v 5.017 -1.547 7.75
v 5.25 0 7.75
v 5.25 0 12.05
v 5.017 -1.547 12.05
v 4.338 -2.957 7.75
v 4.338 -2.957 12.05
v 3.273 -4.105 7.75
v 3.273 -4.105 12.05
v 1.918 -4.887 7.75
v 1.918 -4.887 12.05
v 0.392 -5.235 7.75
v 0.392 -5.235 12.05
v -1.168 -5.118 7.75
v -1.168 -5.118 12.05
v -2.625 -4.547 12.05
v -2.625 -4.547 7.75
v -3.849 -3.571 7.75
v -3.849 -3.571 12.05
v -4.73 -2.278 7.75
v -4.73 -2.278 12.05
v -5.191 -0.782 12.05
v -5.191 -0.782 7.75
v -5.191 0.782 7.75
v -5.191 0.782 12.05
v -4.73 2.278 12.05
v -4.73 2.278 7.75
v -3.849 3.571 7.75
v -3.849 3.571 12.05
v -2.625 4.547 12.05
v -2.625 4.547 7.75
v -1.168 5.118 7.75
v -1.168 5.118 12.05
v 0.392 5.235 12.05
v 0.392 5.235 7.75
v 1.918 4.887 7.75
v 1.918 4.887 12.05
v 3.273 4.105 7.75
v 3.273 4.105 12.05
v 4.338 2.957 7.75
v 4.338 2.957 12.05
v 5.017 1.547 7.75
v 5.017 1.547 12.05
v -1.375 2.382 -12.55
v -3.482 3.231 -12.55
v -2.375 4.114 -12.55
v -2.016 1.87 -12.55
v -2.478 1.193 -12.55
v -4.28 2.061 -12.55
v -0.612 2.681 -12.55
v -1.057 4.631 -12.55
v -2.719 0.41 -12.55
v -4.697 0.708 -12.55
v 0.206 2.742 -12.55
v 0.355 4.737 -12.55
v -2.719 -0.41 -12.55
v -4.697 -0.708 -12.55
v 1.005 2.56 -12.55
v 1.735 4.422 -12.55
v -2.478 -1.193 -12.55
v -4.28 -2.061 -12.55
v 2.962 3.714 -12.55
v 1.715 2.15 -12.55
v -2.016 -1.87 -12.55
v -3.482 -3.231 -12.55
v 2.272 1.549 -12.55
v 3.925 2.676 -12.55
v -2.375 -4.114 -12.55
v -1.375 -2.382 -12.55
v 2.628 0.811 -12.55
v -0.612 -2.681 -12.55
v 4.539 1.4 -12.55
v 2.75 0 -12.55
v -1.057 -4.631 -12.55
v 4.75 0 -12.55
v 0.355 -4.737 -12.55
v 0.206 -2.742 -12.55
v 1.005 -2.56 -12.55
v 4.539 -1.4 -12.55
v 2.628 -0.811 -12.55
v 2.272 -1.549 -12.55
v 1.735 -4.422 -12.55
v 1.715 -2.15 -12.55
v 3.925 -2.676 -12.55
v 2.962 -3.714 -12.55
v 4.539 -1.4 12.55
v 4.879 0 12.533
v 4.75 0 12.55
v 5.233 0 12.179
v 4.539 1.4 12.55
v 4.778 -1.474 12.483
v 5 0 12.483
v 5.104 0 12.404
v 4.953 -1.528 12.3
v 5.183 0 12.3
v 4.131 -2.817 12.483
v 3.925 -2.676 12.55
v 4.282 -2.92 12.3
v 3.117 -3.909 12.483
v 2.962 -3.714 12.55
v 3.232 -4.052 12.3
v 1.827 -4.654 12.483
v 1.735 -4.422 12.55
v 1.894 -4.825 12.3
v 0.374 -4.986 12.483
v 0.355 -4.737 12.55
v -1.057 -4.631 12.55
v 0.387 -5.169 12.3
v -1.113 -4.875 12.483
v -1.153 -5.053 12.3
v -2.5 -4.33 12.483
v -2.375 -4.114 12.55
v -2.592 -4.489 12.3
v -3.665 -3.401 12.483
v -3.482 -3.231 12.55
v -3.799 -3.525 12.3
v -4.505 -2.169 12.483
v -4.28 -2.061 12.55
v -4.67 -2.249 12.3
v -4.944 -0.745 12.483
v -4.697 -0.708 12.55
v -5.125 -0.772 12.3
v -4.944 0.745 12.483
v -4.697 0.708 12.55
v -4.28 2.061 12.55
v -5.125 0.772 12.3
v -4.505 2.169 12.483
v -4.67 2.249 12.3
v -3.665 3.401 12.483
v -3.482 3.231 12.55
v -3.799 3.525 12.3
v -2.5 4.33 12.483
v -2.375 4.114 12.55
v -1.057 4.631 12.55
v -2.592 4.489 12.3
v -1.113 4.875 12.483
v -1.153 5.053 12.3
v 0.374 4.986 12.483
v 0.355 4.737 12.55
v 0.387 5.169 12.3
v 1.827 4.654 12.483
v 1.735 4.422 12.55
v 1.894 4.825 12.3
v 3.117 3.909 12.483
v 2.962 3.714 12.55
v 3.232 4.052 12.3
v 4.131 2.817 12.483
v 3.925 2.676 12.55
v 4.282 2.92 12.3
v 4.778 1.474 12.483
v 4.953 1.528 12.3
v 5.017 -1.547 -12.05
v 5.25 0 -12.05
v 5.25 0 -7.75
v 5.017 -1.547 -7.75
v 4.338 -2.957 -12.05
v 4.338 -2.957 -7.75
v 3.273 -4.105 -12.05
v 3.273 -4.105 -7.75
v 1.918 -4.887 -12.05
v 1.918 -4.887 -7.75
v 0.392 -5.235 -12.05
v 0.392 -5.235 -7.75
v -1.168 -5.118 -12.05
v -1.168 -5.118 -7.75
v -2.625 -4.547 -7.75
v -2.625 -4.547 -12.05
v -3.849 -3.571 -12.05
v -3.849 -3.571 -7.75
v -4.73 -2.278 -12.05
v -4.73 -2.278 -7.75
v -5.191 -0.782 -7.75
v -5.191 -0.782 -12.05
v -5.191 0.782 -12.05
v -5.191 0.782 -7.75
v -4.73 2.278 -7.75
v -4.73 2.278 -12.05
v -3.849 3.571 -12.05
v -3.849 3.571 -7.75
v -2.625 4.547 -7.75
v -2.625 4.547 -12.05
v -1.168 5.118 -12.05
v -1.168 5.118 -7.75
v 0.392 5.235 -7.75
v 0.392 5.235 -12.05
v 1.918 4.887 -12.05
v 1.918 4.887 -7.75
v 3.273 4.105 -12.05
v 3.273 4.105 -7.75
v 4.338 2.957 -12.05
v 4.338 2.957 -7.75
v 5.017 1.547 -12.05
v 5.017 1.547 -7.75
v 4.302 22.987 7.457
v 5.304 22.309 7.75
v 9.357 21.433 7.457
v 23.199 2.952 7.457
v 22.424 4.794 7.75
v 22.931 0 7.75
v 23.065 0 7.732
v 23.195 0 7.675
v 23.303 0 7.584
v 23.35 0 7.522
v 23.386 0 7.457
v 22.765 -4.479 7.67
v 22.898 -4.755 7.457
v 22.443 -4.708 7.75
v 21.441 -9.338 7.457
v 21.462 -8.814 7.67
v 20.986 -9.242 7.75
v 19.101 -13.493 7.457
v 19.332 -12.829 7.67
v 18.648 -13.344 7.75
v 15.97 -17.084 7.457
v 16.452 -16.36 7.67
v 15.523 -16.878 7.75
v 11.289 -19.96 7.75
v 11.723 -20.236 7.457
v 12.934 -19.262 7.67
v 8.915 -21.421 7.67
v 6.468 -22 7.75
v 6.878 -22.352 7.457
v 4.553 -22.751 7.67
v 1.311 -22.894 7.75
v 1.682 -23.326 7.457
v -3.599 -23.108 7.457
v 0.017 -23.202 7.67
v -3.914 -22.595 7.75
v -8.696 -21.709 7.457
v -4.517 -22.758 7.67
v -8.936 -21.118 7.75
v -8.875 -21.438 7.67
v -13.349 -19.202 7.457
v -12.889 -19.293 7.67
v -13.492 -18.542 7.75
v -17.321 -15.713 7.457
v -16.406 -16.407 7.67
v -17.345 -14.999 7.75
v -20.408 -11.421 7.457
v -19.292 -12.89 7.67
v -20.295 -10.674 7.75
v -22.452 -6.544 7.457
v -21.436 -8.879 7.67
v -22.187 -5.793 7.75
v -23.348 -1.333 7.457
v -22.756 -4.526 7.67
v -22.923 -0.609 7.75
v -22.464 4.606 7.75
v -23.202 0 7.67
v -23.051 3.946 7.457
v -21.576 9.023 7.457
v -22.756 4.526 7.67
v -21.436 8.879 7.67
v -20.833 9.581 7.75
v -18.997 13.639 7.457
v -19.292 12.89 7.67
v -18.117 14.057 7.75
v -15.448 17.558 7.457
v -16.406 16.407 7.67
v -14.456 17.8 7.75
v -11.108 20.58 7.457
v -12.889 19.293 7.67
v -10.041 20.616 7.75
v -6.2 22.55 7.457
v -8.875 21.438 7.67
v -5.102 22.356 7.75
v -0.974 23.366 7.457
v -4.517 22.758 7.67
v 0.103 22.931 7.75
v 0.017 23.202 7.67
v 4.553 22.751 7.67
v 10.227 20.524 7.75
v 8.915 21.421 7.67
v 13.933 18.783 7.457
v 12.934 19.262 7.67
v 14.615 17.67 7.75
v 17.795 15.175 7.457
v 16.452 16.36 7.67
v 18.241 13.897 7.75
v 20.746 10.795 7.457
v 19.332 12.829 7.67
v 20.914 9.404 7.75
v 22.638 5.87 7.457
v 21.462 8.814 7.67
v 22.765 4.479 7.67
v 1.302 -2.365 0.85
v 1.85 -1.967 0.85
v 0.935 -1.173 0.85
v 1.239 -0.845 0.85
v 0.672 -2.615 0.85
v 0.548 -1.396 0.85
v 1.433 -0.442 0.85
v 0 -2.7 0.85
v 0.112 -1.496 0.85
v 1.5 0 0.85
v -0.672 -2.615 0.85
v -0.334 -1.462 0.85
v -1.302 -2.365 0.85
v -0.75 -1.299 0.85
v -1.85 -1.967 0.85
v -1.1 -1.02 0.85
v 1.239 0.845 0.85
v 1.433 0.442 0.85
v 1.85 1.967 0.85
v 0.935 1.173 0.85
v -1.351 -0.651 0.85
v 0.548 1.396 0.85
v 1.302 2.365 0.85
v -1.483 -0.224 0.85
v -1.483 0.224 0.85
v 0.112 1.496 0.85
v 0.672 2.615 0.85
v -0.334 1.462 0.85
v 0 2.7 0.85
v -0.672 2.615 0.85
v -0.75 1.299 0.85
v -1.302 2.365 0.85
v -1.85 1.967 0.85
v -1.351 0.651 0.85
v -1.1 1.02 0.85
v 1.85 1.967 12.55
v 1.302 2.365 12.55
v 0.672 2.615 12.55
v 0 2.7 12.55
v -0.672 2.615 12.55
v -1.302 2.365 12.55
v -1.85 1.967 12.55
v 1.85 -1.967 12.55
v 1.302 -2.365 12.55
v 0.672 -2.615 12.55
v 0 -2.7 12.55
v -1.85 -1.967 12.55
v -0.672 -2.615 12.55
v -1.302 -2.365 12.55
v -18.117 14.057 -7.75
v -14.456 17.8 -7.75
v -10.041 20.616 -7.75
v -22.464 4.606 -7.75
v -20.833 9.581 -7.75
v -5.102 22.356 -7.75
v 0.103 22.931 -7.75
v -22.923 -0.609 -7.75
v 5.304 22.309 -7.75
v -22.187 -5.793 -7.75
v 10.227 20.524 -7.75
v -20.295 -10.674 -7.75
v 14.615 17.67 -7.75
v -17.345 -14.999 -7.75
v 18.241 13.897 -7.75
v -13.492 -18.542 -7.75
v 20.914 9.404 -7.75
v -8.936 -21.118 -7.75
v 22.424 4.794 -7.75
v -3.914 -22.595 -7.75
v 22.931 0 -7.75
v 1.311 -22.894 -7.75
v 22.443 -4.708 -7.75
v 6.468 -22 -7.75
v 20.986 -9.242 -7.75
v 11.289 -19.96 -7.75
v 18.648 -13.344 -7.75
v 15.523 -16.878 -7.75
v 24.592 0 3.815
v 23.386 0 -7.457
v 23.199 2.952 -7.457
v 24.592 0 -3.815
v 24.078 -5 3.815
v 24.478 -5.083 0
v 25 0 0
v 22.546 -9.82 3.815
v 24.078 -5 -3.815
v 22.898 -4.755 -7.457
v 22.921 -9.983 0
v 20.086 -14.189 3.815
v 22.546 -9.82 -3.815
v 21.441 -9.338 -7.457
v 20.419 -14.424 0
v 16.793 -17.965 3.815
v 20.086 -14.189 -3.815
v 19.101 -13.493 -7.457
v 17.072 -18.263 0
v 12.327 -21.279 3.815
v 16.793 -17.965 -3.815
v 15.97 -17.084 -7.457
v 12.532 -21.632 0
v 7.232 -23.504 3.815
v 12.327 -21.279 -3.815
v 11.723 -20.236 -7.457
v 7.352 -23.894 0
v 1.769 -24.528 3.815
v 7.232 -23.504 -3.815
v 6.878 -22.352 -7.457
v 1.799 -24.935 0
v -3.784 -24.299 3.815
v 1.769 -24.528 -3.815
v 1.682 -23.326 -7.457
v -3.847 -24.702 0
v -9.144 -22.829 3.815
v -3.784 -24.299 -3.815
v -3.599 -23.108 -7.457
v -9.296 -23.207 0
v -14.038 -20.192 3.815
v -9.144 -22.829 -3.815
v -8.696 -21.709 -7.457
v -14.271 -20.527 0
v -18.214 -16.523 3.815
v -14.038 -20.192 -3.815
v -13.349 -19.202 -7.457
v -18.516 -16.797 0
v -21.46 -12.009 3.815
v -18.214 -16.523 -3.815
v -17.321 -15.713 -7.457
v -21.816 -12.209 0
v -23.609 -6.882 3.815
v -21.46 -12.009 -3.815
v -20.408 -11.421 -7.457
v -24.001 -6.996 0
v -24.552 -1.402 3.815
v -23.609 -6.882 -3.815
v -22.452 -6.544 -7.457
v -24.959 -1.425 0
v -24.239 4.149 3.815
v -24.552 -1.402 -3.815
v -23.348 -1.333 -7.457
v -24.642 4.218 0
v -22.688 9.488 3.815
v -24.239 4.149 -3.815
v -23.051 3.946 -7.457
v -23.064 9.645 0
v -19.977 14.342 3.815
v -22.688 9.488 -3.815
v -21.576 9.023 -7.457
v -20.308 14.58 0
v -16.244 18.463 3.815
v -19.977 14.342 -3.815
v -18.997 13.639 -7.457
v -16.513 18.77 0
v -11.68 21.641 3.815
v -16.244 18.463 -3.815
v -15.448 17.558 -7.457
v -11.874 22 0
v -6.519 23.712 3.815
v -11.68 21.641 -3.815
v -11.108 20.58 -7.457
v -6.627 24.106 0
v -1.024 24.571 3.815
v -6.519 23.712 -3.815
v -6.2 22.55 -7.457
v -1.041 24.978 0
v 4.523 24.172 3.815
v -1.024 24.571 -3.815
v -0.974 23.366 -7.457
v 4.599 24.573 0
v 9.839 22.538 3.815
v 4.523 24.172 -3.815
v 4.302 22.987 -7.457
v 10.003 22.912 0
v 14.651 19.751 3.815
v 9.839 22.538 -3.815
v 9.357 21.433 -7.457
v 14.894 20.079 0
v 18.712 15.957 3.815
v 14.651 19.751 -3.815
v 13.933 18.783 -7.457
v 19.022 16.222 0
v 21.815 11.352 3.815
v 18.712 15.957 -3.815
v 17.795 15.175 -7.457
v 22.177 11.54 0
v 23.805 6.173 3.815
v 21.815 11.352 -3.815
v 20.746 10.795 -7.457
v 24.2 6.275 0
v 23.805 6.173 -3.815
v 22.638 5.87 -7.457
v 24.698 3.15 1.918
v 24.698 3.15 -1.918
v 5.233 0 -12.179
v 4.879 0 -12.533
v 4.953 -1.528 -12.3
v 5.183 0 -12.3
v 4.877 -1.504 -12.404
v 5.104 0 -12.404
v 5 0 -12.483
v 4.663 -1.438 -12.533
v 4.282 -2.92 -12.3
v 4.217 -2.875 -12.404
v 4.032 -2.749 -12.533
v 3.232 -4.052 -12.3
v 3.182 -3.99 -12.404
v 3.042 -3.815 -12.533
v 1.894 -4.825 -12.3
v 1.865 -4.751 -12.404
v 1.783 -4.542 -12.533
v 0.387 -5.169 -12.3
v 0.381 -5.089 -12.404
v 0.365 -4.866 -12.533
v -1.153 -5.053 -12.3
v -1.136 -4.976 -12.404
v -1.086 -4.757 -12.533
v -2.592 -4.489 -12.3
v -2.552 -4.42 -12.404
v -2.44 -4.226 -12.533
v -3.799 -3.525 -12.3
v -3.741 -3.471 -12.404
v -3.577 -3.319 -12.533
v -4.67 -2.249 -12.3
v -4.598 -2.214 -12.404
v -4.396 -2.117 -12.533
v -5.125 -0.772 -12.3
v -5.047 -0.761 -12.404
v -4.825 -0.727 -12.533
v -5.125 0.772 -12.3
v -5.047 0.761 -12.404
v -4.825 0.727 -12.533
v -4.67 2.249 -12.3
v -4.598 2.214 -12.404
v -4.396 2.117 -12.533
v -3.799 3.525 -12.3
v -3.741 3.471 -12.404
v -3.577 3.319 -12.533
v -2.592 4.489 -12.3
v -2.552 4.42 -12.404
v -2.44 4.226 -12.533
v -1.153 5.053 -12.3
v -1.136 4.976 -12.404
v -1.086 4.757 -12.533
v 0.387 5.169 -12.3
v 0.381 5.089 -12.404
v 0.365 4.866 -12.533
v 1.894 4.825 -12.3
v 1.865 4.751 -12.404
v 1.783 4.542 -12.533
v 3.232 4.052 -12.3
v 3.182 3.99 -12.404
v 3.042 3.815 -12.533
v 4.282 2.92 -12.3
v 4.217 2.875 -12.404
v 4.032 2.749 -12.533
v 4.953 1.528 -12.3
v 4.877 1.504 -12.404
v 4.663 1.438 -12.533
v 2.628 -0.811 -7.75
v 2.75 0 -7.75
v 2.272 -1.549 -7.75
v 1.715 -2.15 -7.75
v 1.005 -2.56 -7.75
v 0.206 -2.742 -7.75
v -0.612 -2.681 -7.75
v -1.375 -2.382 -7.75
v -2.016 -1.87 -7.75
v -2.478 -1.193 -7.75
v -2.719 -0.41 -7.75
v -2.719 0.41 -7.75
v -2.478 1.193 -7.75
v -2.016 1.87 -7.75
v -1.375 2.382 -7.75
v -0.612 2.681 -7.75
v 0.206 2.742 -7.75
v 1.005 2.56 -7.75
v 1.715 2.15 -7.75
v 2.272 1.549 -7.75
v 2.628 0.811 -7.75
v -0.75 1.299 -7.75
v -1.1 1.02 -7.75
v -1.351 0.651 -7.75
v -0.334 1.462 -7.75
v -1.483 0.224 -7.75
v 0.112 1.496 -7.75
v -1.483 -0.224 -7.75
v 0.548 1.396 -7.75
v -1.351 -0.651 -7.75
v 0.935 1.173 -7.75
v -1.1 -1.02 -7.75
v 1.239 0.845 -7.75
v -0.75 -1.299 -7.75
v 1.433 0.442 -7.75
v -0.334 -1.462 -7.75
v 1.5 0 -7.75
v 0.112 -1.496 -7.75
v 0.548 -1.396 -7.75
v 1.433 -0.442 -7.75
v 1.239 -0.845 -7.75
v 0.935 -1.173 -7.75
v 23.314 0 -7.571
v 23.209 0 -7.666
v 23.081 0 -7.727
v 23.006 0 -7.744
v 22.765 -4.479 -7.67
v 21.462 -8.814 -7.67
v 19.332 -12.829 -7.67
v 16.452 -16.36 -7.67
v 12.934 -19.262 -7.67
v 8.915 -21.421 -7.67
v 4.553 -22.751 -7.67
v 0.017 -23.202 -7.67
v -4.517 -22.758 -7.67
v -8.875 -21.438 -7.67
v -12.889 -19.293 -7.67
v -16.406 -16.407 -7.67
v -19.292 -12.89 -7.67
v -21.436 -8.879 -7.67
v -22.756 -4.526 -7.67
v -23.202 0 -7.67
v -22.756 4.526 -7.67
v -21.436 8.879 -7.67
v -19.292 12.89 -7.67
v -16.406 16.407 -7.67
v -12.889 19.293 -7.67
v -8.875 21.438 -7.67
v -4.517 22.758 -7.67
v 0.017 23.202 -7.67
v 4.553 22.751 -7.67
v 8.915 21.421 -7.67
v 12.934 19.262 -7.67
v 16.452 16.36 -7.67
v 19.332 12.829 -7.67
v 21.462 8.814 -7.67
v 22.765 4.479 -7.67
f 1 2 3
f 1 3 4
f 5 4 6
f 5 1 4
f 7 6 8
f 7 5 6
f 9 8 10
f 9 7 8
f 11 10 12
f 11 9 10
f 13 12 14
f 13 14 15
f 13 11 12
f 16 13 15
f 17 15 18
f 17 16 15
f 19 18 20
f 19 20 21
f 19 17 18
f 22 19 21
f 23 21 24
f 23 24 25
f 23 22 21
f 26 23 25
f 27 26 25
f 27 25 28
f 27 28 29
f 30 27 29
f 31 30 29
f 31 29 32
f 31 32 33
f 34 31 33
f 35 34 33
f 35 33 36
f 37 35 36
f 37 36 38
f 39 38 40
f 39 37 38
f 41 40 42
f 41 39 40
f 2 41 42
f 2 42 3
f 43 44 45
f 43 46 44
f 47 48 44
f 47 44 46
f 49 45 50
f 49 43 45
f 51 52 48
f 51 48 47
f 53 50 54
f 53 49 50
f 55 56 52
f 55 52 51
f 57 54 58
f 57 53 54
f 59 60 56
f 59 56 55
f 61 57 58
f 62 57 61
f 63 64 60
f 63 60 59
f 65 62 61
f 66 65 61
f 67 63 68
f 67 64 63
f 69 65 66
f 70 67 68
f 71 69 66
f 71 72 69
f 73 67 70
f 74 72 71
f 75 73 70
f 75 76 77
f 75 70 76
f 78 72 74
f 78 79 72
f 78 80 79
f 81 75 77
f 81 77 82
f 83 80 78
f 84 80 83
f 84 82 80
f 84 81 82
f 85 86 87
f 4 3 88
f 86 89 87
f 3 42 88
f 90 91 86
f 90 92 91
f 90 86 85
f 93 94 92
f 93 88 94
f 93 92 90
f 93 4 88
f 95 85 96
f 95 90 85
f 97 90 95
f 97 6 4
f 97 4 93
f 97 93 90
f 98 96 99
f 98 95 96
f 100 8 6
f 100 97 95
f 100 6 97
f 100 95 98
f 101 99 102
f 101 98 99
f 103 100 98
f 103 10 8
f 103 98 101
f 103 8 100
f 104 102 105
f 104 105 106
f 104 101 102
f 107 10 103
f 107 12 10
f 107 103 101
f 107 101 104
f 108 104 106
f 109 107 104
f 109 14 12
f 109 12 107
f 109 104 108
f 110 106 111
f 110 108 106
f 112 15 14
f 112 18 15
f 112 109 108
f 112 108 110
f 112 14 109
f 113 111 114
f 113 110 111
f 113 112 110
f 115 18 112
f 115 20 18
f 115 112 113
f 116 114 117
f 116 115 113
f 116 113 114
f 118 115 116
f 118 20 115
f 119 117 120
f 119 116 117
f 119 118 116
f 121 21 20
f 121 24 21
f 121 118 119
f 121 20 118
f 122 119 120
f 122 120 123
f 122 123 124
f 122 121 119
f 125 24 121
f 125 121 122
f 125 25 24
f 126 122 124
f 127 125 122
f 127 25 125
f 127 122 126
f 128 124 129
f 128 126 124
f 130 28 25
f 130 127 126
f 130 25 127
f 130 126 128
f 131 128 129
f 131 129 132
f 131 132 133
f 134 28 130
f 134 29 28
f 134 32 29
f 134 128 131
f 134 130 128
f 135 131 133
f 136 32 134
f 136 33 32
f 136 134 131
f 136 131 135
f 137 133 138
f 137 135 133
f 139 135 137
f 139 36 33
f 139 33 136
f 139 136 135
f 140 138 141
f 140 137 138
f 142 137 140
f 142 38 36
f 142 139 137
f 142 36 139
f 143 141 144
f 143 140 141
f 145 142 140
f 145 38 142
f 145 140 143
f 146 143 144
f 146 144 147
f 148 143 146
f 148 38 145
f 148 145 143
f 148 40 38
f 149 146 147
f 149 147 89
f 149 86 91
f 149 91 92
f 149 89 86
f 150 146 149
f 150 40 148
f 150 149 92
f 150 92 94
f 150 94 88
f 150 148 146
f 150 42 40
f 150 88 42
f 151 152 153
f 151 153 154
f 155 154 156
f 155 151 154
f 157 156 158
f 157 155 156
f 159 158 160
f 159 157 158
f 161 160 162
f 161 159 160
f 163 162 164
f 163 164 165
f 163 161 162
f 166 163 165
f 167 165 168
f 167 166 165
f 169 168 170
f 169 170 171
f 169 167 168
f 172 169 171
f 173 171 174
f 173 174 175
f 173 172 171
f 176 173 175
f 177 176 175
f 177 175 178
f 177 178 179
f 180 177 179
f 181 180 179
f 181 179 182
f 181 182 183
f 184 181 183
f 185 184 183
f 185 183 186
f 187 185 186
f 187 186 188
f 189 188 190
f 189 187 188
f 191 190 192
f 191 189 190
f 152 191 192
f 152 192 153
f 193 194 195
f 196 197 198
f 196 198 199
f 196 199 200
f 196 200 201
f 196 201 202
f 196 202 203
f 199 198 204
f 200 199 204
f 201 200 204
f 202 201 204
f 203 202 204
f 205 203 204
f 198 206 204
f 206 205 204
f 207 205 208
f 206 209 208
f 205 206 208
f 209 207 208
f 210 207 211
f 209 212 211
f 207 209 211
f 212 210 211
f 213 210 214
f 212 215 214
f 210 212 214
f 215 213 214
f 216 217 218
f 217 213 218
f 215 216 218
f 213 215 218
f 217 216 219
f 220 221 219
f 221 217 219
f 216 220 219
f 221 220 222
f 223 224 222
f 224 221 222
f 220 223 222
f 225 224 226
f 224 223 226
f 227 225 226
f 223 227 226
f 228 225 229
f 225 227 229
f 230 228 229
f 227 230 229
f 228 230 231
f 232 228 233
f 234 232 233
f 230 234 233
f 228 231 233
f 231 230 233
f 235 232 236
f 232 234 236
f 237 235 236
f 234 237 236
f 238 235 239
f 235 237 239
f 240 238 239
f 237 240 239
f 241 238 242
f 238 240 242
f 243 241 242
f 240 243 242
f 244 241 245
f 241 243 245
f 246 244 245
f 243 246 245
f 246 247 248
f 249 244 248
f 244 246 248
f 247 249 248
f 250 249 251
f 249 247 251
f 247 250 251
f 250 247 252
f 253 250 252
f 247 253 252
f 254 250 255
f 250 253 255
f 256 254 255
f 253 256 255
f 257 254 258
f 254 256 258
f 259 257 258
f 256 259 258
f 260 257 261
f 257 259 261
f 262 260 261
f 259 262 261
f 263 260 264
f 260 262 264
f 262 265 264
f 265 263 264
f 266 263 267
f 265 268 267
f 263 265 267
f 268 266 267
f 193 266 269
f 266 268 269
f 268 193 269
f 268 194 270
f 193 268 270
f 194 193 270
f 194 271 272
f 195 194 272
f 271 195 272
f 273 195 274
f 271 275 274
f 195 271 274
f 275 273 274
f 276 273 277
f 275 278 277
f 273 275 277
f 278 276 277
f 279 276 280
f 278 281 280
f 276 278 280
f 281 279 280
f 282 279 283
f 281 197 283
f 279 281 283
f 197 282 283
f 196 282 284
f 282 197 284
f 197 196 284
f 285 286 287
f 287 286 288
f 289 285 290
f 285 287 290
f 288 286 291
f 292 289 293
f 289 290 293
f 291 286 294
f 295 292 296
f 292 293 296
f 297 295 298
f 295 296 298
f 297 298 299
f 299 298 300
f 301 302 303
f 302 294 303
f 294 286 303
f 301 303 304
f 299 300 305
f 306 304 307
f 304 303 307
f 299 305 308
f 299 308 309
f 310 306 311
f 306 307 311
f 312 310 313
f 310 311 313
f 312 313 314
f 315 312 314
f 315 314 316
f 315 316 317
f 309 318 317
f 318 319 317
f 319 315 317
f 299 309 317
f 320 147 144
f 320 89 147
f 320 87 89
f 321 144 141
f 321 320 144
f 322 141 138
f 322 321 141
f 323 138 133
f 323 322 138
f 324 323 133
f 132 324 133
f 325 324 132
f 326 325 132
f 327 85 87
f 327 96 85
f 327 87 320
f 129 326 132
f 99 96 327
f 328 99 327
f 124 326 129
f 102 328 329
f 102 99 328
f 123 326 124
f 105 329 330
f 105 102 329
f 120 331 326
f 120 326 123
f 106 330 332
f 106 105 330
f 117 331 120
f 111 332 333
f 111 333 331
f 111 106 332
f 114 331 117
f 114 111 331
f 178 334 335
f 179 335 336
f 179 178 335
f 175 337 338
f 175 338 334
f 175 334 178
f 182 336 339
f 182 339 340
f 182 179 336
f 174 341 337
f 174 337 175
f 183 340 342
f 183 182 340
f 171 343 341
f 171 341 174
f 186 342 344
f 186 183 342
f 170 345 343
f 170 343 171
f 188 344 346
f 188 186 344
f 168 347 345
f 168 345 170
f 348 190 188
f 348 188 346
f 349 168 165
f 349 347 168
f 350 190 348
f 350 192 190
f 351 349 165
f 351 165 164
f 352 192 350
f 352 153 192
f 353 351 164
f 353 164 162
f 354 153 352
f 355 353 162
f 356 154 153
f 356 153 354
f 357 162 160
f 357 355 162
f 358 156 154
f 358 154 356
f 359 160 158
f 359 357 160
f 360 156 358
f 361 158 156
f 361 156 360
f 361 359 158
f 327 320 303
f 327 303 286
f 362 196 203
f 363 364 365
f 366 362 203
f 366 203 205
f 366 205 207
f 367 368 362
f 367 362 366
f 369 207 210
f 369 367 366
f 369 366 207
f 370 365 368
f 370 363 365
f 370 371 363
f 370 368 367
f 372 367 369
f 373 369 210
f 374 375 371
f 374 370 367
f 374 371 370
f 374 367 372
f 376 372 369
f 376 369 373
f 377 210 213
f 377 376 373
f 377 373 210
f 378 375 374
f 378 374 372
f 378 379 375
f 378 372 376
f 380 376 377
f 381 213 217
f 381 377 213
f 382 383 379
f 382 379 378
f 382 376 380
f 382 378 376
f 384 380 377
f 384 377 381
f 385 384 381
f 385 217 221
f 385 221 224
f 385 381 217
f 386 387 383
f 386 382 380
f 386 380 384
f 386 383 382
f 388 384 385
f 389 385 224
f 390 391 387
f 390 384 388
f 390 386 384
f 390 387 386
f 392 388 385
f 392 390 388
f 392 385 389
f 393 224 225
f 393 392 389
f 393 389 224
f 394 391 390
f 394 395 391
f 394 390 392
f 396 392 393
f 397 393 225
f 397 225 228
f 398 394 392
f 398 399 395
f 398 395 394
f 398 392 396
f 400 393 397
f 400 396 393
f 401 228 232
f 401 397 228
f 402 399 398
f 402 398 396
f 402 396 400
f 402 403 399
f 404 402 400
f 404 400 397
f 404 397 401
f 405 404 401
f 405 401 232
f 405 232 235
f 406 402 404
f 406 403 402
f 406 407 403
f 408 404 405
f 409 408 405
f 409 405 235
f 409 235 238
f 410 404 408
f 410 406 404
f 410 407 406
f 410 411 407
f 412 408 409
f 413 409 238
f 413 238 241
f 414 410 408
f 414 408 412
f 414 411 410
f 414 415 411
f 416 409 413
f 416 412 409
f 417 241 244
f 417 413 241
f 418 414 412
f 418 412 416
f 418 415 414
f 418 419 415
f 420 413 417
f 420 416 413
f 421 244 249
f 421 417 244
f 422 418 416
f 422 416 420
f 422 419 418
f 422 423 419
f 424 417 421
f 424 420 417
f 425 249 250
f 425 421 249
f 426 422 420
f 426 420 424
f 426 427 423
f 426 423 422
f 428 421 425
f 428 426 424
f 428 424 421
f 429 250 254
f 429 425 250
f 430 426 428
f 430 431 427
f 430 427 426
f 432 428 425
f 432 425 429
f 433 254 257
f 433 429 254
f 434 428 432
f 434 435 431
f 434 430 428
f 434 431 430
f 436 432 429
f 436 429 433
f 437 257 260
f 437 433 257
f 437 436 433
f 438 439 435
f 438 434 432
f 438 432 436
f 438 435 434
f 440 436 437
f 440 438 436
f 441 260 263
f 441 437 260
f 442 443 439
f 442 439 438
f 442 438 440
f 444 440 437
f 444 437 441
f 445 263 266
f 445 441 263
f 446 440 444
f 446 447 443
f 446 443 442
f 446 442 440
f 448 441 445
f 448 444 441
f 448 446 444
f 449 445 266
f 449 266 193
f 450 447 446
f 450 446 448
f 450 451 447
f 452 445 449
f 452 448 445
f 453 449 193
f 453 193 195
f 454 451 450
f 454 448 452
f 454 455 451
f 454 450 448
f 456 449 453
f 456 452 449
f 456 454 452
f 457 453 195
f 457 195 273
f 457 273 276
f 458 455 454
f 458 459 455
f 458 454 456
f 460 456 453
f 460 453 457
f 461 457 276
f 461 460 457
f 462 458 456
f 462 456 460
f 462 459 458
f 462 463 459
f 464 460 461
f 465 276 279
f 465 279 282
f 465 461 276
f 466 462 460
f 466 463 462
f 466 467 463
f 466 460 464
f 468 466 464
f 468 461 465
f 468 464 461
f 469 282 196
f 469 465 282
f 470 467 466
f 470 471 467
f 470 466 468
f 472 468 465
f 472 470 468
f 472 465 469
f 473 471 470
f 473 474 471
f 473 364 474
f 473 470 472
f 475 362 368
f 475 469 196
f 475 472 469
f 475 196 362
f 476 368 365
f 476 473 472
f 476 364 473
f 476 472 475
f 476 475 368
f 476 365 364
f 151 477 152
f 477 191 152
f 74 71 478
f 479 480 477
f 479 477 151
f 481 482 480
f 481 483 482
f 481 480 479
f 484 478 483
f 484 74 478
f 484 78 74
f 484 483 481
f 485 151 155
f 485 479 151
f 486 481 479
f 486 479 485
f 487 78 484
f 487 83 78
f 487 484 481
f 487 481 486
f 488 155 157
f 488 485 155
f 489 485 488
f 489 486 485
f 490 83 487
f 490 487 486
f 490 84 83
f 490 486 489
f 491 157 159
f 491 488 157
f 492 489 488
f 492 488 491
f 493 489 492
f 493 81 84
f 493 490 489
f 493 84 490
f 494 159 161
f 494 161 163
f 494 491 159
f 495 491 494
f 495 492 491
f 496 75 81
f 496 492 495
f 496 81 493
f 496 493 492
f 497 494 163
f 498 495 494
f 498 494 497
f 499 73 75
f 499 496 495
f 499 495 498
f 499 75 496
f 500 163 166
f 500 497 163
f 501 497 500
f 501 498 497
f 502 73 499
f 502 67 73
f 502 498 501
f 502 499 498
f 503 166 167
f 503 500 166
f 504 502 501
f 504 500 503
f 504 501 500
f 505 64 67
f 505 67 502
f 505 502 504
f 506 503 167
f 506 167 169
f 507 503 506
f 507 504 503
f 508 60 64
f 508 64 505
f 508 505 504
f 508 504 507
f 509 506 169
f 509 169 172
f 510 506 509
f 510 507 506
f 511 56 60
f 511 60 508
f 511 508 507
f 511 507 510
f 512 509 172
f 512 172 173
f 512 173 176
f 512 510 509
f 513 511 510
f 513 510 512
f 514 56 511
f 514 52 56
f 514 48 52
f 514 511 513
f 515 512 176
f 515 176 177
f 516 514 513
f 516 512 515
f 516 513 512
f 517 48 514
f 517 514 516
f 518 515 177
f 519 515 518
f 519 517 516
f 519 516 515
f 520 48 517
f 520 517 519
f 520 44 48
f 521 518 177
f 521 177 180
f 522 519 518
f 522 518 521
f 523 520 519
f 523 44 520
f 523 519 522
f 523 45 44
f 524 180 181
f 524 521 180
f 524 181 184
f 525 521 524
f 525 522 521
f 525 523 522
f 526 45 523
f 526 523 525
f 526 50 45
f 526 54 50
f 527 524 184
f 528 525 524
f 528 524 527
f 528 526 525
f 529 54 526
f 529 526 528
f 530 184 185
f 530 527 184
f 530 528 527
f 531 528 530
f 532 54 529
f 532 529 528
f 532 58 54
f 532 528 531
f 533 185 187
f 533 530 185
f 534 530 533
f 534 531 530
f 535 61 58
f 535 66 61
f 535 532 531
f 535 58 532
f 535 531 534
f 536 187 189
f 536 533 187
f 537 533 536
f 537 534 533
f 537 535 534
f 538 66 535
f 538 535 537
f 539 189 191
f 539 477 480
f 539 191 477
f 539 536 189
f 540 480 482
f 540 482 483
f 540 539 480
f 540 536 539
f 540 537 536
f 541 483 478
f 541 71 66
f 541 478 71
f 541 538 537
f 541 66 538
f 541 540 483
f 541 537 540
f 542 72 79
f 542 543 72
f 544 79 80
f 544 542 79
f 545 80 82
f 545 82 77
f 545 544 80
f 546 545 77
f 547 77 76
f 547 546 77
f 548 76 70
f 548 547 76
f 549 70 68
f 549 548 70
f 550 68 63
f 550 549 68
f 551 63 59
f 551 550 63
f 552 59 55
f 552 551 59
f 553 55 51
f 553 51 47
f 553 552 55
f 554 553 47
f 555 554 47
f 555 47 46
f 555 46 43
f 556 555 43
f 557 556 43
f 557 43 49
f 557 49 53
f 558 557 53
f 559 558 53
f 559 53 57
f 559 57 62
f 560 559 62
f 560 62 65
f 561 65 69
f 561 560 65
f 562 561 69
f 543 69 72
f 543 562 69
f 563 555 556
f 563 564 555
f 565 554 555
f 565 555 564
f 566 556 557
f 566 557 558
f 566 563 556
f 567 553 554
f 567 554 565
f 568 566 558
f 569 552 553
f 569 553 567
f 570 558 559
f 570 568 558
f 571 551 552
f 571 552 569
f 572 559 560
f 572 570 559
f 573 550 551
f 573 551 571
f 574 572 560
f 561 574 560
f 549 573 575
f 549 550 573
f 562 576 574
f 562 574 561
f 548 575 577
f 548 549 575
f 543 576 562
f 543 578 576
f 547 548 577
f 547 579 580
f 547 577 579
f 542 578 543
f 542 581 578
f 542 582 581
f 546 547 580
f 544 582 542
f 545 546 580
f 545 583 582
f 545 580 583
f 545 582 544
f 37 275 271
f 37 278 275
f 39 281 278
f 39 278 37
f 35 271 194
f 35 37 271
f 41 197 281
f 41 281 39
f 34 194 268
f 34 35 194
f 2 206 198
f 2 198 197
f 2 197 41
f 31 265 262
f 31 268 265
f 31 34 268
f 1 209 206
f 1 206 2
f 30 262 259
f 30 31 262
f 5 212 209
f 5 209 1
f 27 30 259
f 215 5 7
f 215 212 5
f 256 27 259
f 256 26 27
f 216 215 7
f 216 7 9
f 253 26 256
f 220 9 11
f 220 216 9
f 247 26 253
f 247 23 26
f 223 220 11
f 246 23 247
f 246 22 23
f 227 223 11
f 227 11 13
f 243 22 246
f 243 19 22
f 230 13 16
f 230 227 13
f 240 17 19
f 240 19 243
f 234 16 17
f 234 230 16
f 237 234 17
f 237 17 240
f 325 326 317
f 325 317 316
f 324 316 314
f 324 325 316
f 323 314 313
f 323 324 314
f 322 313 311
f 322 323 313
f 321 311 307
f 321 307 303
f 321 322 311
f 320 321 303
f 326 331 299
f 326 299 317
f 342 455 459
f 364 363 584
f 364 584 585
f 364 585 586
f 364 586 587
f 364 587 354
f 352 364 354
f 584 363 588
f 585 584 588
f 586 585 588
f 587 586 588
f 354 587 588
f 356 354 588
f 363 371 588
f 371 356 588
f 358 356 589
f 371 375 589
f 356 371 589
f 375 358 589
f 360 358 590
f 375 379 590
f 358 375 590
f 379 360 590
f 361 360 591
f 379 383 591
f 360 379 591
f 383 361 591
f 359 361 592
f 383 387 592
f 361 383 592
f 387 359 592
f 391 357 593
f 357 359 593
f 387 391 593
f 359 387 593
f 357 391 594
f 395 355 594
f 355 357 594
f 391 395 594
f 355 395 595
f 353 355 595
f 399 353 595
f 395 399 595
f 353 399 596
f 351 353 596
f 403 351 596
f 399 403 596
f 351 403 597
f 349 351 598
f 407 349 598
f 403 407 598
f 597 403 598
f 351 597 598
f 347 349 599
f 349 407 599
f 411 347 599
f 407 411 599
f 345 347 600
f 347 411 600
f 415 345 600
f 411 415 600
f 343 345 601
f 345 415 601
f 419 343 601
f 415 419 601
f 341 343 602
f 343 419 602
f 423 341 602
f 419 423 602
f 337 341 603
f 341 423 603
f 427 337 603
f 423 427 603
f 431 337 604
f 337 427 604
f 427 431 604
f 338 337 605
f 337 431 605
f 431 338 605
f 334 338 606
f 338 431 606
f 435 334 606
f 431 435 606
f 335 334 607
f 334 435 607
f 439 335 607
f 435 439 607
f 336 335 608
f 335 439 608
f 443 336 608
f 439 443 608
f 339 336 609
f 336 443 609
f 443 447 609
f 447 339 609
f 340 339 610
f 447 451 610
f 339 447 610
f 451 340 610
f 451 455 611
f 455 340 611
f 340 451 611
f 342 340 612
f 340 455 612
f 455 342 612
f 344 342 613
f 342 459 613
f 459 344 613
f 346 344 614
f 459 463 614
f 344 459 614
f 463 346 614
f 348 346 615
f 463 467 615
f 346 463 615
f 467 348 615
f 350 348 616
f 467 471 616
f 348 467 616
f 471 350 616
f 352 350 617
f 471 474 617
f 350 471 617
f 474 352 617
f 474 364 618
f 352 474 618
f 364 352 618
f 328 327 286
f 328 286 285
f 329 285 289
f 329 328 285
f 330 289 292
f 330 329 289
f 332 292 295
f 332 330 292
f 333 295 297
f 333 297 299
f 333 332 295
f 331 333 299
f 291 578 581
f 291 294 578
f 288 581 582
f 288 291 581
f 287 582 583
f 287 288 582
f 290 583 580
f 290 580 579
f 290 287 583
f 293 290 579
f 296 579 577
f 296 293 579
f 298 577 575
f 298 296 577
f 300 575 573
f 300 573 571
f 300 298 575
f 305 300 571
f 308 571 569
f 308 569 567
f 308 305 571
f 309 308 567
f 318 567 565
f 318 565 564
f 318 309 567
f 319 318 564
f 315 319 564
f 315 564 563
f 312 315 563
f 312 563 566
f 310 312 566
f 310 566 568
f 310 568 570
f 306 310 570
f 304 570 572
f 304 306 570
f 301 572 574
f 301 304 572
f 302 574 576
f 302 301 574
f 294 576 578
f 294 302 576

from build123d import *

# Parameters (mm, degrees)
CUT_EXTRUDE1_DEPTH = 11.7
FILLET1_R          = 0.5


with BuildPart() as part:
    # Sketch1 → Revolve1 (revolve)
    with BuildSketch(Plane(origin=(0, 0, 0), x_dir=(0, 0, -1), z_dir=(1, 0, 0)), mode=Mode.PRIVATE) as revolve1_sk:
        with BuildLine():
            Line((-12.55, 0), (-12.55, 5.25))
            Line((-12.55, 5.25), (-7.75, 5.25))
            Line((-7.75, 5.25), (-7.75, 23.25))
            ThreePointArc((-7.75, 23.25), (0, 25), (7.75, 23.25))
            Line((7.75, 23.25), (7.75, 5.25))
            Line((7.75, 5.25), (12.55, 5.25))
            Line((12.55, 5.25), (12.55, 0))
            Line((12.55, 0), (-12.55, 0))
        make_face()
    revolve(revolve1_sk.sketch.rotate(Axis((0, 0, 18.636822546), (0, 0, -1)), 90), axis=Axis((0, 0, 18.636822546), (0, 0, -1)))

    # Sketch2 → Cut-Revolve1 (revolve, cut)
    with BuildSketch(Plane(origin=(0, 0, 0), x_dir=(0, 0, -1), z_dir=(1, 0, 0)), mode=Mode.PRIVATE) as cut_revolve1_sk:
        Polygon((12.55, 0), (12.55, 2.75), (7.75, 2.75), (7.75, 1.5), (-0.85, 1.5), (-0.85, 0), align=None)
    revolve(cut_revolve1_sk.sketch.rotate(Axis((0, 0, 16.393312062), (0, 0, -1)), 90), axis=Axis((0, 0, 16.393312062), (0, 0, -1)), mode=Mode.SUBTRACT)

    # Sketch3 → Cut-Extrude1 (cut)
    with BuildSketch(Plane.XY.offset(12.55)):
        with BuildLine():
            Line((-1.85, -1.966596044), (-1.85, 1.966596044))
            ThreePointArc((-1.85, 1.966596044), (0, 2.7), (1.85, 1.966596044))
            Line((1.85, 1.966596044), (1.85, -1.966596044))
            ThreePointArc((1.85, -1.966596044), (0, -2.7), (-1.85, -1.966596044))
        make_face()
    extrude(amount=-CUT_EXTRUDE1_DEPTH, mode=Mode.SUBTRACT)

    # Fillet1
    fillet1_edges = [part.edges().sort_by_distance(p)[0] for p in [
        (-5.25, 0, 12.55),
        (-23.25, 0, 7.75),
        (-23.25, 0, -7.75),
        (-5.25, 0, -12.55),
    ]]
    fillet(fillet1_edges, radius=FILLET1_R)


solid = part.part
